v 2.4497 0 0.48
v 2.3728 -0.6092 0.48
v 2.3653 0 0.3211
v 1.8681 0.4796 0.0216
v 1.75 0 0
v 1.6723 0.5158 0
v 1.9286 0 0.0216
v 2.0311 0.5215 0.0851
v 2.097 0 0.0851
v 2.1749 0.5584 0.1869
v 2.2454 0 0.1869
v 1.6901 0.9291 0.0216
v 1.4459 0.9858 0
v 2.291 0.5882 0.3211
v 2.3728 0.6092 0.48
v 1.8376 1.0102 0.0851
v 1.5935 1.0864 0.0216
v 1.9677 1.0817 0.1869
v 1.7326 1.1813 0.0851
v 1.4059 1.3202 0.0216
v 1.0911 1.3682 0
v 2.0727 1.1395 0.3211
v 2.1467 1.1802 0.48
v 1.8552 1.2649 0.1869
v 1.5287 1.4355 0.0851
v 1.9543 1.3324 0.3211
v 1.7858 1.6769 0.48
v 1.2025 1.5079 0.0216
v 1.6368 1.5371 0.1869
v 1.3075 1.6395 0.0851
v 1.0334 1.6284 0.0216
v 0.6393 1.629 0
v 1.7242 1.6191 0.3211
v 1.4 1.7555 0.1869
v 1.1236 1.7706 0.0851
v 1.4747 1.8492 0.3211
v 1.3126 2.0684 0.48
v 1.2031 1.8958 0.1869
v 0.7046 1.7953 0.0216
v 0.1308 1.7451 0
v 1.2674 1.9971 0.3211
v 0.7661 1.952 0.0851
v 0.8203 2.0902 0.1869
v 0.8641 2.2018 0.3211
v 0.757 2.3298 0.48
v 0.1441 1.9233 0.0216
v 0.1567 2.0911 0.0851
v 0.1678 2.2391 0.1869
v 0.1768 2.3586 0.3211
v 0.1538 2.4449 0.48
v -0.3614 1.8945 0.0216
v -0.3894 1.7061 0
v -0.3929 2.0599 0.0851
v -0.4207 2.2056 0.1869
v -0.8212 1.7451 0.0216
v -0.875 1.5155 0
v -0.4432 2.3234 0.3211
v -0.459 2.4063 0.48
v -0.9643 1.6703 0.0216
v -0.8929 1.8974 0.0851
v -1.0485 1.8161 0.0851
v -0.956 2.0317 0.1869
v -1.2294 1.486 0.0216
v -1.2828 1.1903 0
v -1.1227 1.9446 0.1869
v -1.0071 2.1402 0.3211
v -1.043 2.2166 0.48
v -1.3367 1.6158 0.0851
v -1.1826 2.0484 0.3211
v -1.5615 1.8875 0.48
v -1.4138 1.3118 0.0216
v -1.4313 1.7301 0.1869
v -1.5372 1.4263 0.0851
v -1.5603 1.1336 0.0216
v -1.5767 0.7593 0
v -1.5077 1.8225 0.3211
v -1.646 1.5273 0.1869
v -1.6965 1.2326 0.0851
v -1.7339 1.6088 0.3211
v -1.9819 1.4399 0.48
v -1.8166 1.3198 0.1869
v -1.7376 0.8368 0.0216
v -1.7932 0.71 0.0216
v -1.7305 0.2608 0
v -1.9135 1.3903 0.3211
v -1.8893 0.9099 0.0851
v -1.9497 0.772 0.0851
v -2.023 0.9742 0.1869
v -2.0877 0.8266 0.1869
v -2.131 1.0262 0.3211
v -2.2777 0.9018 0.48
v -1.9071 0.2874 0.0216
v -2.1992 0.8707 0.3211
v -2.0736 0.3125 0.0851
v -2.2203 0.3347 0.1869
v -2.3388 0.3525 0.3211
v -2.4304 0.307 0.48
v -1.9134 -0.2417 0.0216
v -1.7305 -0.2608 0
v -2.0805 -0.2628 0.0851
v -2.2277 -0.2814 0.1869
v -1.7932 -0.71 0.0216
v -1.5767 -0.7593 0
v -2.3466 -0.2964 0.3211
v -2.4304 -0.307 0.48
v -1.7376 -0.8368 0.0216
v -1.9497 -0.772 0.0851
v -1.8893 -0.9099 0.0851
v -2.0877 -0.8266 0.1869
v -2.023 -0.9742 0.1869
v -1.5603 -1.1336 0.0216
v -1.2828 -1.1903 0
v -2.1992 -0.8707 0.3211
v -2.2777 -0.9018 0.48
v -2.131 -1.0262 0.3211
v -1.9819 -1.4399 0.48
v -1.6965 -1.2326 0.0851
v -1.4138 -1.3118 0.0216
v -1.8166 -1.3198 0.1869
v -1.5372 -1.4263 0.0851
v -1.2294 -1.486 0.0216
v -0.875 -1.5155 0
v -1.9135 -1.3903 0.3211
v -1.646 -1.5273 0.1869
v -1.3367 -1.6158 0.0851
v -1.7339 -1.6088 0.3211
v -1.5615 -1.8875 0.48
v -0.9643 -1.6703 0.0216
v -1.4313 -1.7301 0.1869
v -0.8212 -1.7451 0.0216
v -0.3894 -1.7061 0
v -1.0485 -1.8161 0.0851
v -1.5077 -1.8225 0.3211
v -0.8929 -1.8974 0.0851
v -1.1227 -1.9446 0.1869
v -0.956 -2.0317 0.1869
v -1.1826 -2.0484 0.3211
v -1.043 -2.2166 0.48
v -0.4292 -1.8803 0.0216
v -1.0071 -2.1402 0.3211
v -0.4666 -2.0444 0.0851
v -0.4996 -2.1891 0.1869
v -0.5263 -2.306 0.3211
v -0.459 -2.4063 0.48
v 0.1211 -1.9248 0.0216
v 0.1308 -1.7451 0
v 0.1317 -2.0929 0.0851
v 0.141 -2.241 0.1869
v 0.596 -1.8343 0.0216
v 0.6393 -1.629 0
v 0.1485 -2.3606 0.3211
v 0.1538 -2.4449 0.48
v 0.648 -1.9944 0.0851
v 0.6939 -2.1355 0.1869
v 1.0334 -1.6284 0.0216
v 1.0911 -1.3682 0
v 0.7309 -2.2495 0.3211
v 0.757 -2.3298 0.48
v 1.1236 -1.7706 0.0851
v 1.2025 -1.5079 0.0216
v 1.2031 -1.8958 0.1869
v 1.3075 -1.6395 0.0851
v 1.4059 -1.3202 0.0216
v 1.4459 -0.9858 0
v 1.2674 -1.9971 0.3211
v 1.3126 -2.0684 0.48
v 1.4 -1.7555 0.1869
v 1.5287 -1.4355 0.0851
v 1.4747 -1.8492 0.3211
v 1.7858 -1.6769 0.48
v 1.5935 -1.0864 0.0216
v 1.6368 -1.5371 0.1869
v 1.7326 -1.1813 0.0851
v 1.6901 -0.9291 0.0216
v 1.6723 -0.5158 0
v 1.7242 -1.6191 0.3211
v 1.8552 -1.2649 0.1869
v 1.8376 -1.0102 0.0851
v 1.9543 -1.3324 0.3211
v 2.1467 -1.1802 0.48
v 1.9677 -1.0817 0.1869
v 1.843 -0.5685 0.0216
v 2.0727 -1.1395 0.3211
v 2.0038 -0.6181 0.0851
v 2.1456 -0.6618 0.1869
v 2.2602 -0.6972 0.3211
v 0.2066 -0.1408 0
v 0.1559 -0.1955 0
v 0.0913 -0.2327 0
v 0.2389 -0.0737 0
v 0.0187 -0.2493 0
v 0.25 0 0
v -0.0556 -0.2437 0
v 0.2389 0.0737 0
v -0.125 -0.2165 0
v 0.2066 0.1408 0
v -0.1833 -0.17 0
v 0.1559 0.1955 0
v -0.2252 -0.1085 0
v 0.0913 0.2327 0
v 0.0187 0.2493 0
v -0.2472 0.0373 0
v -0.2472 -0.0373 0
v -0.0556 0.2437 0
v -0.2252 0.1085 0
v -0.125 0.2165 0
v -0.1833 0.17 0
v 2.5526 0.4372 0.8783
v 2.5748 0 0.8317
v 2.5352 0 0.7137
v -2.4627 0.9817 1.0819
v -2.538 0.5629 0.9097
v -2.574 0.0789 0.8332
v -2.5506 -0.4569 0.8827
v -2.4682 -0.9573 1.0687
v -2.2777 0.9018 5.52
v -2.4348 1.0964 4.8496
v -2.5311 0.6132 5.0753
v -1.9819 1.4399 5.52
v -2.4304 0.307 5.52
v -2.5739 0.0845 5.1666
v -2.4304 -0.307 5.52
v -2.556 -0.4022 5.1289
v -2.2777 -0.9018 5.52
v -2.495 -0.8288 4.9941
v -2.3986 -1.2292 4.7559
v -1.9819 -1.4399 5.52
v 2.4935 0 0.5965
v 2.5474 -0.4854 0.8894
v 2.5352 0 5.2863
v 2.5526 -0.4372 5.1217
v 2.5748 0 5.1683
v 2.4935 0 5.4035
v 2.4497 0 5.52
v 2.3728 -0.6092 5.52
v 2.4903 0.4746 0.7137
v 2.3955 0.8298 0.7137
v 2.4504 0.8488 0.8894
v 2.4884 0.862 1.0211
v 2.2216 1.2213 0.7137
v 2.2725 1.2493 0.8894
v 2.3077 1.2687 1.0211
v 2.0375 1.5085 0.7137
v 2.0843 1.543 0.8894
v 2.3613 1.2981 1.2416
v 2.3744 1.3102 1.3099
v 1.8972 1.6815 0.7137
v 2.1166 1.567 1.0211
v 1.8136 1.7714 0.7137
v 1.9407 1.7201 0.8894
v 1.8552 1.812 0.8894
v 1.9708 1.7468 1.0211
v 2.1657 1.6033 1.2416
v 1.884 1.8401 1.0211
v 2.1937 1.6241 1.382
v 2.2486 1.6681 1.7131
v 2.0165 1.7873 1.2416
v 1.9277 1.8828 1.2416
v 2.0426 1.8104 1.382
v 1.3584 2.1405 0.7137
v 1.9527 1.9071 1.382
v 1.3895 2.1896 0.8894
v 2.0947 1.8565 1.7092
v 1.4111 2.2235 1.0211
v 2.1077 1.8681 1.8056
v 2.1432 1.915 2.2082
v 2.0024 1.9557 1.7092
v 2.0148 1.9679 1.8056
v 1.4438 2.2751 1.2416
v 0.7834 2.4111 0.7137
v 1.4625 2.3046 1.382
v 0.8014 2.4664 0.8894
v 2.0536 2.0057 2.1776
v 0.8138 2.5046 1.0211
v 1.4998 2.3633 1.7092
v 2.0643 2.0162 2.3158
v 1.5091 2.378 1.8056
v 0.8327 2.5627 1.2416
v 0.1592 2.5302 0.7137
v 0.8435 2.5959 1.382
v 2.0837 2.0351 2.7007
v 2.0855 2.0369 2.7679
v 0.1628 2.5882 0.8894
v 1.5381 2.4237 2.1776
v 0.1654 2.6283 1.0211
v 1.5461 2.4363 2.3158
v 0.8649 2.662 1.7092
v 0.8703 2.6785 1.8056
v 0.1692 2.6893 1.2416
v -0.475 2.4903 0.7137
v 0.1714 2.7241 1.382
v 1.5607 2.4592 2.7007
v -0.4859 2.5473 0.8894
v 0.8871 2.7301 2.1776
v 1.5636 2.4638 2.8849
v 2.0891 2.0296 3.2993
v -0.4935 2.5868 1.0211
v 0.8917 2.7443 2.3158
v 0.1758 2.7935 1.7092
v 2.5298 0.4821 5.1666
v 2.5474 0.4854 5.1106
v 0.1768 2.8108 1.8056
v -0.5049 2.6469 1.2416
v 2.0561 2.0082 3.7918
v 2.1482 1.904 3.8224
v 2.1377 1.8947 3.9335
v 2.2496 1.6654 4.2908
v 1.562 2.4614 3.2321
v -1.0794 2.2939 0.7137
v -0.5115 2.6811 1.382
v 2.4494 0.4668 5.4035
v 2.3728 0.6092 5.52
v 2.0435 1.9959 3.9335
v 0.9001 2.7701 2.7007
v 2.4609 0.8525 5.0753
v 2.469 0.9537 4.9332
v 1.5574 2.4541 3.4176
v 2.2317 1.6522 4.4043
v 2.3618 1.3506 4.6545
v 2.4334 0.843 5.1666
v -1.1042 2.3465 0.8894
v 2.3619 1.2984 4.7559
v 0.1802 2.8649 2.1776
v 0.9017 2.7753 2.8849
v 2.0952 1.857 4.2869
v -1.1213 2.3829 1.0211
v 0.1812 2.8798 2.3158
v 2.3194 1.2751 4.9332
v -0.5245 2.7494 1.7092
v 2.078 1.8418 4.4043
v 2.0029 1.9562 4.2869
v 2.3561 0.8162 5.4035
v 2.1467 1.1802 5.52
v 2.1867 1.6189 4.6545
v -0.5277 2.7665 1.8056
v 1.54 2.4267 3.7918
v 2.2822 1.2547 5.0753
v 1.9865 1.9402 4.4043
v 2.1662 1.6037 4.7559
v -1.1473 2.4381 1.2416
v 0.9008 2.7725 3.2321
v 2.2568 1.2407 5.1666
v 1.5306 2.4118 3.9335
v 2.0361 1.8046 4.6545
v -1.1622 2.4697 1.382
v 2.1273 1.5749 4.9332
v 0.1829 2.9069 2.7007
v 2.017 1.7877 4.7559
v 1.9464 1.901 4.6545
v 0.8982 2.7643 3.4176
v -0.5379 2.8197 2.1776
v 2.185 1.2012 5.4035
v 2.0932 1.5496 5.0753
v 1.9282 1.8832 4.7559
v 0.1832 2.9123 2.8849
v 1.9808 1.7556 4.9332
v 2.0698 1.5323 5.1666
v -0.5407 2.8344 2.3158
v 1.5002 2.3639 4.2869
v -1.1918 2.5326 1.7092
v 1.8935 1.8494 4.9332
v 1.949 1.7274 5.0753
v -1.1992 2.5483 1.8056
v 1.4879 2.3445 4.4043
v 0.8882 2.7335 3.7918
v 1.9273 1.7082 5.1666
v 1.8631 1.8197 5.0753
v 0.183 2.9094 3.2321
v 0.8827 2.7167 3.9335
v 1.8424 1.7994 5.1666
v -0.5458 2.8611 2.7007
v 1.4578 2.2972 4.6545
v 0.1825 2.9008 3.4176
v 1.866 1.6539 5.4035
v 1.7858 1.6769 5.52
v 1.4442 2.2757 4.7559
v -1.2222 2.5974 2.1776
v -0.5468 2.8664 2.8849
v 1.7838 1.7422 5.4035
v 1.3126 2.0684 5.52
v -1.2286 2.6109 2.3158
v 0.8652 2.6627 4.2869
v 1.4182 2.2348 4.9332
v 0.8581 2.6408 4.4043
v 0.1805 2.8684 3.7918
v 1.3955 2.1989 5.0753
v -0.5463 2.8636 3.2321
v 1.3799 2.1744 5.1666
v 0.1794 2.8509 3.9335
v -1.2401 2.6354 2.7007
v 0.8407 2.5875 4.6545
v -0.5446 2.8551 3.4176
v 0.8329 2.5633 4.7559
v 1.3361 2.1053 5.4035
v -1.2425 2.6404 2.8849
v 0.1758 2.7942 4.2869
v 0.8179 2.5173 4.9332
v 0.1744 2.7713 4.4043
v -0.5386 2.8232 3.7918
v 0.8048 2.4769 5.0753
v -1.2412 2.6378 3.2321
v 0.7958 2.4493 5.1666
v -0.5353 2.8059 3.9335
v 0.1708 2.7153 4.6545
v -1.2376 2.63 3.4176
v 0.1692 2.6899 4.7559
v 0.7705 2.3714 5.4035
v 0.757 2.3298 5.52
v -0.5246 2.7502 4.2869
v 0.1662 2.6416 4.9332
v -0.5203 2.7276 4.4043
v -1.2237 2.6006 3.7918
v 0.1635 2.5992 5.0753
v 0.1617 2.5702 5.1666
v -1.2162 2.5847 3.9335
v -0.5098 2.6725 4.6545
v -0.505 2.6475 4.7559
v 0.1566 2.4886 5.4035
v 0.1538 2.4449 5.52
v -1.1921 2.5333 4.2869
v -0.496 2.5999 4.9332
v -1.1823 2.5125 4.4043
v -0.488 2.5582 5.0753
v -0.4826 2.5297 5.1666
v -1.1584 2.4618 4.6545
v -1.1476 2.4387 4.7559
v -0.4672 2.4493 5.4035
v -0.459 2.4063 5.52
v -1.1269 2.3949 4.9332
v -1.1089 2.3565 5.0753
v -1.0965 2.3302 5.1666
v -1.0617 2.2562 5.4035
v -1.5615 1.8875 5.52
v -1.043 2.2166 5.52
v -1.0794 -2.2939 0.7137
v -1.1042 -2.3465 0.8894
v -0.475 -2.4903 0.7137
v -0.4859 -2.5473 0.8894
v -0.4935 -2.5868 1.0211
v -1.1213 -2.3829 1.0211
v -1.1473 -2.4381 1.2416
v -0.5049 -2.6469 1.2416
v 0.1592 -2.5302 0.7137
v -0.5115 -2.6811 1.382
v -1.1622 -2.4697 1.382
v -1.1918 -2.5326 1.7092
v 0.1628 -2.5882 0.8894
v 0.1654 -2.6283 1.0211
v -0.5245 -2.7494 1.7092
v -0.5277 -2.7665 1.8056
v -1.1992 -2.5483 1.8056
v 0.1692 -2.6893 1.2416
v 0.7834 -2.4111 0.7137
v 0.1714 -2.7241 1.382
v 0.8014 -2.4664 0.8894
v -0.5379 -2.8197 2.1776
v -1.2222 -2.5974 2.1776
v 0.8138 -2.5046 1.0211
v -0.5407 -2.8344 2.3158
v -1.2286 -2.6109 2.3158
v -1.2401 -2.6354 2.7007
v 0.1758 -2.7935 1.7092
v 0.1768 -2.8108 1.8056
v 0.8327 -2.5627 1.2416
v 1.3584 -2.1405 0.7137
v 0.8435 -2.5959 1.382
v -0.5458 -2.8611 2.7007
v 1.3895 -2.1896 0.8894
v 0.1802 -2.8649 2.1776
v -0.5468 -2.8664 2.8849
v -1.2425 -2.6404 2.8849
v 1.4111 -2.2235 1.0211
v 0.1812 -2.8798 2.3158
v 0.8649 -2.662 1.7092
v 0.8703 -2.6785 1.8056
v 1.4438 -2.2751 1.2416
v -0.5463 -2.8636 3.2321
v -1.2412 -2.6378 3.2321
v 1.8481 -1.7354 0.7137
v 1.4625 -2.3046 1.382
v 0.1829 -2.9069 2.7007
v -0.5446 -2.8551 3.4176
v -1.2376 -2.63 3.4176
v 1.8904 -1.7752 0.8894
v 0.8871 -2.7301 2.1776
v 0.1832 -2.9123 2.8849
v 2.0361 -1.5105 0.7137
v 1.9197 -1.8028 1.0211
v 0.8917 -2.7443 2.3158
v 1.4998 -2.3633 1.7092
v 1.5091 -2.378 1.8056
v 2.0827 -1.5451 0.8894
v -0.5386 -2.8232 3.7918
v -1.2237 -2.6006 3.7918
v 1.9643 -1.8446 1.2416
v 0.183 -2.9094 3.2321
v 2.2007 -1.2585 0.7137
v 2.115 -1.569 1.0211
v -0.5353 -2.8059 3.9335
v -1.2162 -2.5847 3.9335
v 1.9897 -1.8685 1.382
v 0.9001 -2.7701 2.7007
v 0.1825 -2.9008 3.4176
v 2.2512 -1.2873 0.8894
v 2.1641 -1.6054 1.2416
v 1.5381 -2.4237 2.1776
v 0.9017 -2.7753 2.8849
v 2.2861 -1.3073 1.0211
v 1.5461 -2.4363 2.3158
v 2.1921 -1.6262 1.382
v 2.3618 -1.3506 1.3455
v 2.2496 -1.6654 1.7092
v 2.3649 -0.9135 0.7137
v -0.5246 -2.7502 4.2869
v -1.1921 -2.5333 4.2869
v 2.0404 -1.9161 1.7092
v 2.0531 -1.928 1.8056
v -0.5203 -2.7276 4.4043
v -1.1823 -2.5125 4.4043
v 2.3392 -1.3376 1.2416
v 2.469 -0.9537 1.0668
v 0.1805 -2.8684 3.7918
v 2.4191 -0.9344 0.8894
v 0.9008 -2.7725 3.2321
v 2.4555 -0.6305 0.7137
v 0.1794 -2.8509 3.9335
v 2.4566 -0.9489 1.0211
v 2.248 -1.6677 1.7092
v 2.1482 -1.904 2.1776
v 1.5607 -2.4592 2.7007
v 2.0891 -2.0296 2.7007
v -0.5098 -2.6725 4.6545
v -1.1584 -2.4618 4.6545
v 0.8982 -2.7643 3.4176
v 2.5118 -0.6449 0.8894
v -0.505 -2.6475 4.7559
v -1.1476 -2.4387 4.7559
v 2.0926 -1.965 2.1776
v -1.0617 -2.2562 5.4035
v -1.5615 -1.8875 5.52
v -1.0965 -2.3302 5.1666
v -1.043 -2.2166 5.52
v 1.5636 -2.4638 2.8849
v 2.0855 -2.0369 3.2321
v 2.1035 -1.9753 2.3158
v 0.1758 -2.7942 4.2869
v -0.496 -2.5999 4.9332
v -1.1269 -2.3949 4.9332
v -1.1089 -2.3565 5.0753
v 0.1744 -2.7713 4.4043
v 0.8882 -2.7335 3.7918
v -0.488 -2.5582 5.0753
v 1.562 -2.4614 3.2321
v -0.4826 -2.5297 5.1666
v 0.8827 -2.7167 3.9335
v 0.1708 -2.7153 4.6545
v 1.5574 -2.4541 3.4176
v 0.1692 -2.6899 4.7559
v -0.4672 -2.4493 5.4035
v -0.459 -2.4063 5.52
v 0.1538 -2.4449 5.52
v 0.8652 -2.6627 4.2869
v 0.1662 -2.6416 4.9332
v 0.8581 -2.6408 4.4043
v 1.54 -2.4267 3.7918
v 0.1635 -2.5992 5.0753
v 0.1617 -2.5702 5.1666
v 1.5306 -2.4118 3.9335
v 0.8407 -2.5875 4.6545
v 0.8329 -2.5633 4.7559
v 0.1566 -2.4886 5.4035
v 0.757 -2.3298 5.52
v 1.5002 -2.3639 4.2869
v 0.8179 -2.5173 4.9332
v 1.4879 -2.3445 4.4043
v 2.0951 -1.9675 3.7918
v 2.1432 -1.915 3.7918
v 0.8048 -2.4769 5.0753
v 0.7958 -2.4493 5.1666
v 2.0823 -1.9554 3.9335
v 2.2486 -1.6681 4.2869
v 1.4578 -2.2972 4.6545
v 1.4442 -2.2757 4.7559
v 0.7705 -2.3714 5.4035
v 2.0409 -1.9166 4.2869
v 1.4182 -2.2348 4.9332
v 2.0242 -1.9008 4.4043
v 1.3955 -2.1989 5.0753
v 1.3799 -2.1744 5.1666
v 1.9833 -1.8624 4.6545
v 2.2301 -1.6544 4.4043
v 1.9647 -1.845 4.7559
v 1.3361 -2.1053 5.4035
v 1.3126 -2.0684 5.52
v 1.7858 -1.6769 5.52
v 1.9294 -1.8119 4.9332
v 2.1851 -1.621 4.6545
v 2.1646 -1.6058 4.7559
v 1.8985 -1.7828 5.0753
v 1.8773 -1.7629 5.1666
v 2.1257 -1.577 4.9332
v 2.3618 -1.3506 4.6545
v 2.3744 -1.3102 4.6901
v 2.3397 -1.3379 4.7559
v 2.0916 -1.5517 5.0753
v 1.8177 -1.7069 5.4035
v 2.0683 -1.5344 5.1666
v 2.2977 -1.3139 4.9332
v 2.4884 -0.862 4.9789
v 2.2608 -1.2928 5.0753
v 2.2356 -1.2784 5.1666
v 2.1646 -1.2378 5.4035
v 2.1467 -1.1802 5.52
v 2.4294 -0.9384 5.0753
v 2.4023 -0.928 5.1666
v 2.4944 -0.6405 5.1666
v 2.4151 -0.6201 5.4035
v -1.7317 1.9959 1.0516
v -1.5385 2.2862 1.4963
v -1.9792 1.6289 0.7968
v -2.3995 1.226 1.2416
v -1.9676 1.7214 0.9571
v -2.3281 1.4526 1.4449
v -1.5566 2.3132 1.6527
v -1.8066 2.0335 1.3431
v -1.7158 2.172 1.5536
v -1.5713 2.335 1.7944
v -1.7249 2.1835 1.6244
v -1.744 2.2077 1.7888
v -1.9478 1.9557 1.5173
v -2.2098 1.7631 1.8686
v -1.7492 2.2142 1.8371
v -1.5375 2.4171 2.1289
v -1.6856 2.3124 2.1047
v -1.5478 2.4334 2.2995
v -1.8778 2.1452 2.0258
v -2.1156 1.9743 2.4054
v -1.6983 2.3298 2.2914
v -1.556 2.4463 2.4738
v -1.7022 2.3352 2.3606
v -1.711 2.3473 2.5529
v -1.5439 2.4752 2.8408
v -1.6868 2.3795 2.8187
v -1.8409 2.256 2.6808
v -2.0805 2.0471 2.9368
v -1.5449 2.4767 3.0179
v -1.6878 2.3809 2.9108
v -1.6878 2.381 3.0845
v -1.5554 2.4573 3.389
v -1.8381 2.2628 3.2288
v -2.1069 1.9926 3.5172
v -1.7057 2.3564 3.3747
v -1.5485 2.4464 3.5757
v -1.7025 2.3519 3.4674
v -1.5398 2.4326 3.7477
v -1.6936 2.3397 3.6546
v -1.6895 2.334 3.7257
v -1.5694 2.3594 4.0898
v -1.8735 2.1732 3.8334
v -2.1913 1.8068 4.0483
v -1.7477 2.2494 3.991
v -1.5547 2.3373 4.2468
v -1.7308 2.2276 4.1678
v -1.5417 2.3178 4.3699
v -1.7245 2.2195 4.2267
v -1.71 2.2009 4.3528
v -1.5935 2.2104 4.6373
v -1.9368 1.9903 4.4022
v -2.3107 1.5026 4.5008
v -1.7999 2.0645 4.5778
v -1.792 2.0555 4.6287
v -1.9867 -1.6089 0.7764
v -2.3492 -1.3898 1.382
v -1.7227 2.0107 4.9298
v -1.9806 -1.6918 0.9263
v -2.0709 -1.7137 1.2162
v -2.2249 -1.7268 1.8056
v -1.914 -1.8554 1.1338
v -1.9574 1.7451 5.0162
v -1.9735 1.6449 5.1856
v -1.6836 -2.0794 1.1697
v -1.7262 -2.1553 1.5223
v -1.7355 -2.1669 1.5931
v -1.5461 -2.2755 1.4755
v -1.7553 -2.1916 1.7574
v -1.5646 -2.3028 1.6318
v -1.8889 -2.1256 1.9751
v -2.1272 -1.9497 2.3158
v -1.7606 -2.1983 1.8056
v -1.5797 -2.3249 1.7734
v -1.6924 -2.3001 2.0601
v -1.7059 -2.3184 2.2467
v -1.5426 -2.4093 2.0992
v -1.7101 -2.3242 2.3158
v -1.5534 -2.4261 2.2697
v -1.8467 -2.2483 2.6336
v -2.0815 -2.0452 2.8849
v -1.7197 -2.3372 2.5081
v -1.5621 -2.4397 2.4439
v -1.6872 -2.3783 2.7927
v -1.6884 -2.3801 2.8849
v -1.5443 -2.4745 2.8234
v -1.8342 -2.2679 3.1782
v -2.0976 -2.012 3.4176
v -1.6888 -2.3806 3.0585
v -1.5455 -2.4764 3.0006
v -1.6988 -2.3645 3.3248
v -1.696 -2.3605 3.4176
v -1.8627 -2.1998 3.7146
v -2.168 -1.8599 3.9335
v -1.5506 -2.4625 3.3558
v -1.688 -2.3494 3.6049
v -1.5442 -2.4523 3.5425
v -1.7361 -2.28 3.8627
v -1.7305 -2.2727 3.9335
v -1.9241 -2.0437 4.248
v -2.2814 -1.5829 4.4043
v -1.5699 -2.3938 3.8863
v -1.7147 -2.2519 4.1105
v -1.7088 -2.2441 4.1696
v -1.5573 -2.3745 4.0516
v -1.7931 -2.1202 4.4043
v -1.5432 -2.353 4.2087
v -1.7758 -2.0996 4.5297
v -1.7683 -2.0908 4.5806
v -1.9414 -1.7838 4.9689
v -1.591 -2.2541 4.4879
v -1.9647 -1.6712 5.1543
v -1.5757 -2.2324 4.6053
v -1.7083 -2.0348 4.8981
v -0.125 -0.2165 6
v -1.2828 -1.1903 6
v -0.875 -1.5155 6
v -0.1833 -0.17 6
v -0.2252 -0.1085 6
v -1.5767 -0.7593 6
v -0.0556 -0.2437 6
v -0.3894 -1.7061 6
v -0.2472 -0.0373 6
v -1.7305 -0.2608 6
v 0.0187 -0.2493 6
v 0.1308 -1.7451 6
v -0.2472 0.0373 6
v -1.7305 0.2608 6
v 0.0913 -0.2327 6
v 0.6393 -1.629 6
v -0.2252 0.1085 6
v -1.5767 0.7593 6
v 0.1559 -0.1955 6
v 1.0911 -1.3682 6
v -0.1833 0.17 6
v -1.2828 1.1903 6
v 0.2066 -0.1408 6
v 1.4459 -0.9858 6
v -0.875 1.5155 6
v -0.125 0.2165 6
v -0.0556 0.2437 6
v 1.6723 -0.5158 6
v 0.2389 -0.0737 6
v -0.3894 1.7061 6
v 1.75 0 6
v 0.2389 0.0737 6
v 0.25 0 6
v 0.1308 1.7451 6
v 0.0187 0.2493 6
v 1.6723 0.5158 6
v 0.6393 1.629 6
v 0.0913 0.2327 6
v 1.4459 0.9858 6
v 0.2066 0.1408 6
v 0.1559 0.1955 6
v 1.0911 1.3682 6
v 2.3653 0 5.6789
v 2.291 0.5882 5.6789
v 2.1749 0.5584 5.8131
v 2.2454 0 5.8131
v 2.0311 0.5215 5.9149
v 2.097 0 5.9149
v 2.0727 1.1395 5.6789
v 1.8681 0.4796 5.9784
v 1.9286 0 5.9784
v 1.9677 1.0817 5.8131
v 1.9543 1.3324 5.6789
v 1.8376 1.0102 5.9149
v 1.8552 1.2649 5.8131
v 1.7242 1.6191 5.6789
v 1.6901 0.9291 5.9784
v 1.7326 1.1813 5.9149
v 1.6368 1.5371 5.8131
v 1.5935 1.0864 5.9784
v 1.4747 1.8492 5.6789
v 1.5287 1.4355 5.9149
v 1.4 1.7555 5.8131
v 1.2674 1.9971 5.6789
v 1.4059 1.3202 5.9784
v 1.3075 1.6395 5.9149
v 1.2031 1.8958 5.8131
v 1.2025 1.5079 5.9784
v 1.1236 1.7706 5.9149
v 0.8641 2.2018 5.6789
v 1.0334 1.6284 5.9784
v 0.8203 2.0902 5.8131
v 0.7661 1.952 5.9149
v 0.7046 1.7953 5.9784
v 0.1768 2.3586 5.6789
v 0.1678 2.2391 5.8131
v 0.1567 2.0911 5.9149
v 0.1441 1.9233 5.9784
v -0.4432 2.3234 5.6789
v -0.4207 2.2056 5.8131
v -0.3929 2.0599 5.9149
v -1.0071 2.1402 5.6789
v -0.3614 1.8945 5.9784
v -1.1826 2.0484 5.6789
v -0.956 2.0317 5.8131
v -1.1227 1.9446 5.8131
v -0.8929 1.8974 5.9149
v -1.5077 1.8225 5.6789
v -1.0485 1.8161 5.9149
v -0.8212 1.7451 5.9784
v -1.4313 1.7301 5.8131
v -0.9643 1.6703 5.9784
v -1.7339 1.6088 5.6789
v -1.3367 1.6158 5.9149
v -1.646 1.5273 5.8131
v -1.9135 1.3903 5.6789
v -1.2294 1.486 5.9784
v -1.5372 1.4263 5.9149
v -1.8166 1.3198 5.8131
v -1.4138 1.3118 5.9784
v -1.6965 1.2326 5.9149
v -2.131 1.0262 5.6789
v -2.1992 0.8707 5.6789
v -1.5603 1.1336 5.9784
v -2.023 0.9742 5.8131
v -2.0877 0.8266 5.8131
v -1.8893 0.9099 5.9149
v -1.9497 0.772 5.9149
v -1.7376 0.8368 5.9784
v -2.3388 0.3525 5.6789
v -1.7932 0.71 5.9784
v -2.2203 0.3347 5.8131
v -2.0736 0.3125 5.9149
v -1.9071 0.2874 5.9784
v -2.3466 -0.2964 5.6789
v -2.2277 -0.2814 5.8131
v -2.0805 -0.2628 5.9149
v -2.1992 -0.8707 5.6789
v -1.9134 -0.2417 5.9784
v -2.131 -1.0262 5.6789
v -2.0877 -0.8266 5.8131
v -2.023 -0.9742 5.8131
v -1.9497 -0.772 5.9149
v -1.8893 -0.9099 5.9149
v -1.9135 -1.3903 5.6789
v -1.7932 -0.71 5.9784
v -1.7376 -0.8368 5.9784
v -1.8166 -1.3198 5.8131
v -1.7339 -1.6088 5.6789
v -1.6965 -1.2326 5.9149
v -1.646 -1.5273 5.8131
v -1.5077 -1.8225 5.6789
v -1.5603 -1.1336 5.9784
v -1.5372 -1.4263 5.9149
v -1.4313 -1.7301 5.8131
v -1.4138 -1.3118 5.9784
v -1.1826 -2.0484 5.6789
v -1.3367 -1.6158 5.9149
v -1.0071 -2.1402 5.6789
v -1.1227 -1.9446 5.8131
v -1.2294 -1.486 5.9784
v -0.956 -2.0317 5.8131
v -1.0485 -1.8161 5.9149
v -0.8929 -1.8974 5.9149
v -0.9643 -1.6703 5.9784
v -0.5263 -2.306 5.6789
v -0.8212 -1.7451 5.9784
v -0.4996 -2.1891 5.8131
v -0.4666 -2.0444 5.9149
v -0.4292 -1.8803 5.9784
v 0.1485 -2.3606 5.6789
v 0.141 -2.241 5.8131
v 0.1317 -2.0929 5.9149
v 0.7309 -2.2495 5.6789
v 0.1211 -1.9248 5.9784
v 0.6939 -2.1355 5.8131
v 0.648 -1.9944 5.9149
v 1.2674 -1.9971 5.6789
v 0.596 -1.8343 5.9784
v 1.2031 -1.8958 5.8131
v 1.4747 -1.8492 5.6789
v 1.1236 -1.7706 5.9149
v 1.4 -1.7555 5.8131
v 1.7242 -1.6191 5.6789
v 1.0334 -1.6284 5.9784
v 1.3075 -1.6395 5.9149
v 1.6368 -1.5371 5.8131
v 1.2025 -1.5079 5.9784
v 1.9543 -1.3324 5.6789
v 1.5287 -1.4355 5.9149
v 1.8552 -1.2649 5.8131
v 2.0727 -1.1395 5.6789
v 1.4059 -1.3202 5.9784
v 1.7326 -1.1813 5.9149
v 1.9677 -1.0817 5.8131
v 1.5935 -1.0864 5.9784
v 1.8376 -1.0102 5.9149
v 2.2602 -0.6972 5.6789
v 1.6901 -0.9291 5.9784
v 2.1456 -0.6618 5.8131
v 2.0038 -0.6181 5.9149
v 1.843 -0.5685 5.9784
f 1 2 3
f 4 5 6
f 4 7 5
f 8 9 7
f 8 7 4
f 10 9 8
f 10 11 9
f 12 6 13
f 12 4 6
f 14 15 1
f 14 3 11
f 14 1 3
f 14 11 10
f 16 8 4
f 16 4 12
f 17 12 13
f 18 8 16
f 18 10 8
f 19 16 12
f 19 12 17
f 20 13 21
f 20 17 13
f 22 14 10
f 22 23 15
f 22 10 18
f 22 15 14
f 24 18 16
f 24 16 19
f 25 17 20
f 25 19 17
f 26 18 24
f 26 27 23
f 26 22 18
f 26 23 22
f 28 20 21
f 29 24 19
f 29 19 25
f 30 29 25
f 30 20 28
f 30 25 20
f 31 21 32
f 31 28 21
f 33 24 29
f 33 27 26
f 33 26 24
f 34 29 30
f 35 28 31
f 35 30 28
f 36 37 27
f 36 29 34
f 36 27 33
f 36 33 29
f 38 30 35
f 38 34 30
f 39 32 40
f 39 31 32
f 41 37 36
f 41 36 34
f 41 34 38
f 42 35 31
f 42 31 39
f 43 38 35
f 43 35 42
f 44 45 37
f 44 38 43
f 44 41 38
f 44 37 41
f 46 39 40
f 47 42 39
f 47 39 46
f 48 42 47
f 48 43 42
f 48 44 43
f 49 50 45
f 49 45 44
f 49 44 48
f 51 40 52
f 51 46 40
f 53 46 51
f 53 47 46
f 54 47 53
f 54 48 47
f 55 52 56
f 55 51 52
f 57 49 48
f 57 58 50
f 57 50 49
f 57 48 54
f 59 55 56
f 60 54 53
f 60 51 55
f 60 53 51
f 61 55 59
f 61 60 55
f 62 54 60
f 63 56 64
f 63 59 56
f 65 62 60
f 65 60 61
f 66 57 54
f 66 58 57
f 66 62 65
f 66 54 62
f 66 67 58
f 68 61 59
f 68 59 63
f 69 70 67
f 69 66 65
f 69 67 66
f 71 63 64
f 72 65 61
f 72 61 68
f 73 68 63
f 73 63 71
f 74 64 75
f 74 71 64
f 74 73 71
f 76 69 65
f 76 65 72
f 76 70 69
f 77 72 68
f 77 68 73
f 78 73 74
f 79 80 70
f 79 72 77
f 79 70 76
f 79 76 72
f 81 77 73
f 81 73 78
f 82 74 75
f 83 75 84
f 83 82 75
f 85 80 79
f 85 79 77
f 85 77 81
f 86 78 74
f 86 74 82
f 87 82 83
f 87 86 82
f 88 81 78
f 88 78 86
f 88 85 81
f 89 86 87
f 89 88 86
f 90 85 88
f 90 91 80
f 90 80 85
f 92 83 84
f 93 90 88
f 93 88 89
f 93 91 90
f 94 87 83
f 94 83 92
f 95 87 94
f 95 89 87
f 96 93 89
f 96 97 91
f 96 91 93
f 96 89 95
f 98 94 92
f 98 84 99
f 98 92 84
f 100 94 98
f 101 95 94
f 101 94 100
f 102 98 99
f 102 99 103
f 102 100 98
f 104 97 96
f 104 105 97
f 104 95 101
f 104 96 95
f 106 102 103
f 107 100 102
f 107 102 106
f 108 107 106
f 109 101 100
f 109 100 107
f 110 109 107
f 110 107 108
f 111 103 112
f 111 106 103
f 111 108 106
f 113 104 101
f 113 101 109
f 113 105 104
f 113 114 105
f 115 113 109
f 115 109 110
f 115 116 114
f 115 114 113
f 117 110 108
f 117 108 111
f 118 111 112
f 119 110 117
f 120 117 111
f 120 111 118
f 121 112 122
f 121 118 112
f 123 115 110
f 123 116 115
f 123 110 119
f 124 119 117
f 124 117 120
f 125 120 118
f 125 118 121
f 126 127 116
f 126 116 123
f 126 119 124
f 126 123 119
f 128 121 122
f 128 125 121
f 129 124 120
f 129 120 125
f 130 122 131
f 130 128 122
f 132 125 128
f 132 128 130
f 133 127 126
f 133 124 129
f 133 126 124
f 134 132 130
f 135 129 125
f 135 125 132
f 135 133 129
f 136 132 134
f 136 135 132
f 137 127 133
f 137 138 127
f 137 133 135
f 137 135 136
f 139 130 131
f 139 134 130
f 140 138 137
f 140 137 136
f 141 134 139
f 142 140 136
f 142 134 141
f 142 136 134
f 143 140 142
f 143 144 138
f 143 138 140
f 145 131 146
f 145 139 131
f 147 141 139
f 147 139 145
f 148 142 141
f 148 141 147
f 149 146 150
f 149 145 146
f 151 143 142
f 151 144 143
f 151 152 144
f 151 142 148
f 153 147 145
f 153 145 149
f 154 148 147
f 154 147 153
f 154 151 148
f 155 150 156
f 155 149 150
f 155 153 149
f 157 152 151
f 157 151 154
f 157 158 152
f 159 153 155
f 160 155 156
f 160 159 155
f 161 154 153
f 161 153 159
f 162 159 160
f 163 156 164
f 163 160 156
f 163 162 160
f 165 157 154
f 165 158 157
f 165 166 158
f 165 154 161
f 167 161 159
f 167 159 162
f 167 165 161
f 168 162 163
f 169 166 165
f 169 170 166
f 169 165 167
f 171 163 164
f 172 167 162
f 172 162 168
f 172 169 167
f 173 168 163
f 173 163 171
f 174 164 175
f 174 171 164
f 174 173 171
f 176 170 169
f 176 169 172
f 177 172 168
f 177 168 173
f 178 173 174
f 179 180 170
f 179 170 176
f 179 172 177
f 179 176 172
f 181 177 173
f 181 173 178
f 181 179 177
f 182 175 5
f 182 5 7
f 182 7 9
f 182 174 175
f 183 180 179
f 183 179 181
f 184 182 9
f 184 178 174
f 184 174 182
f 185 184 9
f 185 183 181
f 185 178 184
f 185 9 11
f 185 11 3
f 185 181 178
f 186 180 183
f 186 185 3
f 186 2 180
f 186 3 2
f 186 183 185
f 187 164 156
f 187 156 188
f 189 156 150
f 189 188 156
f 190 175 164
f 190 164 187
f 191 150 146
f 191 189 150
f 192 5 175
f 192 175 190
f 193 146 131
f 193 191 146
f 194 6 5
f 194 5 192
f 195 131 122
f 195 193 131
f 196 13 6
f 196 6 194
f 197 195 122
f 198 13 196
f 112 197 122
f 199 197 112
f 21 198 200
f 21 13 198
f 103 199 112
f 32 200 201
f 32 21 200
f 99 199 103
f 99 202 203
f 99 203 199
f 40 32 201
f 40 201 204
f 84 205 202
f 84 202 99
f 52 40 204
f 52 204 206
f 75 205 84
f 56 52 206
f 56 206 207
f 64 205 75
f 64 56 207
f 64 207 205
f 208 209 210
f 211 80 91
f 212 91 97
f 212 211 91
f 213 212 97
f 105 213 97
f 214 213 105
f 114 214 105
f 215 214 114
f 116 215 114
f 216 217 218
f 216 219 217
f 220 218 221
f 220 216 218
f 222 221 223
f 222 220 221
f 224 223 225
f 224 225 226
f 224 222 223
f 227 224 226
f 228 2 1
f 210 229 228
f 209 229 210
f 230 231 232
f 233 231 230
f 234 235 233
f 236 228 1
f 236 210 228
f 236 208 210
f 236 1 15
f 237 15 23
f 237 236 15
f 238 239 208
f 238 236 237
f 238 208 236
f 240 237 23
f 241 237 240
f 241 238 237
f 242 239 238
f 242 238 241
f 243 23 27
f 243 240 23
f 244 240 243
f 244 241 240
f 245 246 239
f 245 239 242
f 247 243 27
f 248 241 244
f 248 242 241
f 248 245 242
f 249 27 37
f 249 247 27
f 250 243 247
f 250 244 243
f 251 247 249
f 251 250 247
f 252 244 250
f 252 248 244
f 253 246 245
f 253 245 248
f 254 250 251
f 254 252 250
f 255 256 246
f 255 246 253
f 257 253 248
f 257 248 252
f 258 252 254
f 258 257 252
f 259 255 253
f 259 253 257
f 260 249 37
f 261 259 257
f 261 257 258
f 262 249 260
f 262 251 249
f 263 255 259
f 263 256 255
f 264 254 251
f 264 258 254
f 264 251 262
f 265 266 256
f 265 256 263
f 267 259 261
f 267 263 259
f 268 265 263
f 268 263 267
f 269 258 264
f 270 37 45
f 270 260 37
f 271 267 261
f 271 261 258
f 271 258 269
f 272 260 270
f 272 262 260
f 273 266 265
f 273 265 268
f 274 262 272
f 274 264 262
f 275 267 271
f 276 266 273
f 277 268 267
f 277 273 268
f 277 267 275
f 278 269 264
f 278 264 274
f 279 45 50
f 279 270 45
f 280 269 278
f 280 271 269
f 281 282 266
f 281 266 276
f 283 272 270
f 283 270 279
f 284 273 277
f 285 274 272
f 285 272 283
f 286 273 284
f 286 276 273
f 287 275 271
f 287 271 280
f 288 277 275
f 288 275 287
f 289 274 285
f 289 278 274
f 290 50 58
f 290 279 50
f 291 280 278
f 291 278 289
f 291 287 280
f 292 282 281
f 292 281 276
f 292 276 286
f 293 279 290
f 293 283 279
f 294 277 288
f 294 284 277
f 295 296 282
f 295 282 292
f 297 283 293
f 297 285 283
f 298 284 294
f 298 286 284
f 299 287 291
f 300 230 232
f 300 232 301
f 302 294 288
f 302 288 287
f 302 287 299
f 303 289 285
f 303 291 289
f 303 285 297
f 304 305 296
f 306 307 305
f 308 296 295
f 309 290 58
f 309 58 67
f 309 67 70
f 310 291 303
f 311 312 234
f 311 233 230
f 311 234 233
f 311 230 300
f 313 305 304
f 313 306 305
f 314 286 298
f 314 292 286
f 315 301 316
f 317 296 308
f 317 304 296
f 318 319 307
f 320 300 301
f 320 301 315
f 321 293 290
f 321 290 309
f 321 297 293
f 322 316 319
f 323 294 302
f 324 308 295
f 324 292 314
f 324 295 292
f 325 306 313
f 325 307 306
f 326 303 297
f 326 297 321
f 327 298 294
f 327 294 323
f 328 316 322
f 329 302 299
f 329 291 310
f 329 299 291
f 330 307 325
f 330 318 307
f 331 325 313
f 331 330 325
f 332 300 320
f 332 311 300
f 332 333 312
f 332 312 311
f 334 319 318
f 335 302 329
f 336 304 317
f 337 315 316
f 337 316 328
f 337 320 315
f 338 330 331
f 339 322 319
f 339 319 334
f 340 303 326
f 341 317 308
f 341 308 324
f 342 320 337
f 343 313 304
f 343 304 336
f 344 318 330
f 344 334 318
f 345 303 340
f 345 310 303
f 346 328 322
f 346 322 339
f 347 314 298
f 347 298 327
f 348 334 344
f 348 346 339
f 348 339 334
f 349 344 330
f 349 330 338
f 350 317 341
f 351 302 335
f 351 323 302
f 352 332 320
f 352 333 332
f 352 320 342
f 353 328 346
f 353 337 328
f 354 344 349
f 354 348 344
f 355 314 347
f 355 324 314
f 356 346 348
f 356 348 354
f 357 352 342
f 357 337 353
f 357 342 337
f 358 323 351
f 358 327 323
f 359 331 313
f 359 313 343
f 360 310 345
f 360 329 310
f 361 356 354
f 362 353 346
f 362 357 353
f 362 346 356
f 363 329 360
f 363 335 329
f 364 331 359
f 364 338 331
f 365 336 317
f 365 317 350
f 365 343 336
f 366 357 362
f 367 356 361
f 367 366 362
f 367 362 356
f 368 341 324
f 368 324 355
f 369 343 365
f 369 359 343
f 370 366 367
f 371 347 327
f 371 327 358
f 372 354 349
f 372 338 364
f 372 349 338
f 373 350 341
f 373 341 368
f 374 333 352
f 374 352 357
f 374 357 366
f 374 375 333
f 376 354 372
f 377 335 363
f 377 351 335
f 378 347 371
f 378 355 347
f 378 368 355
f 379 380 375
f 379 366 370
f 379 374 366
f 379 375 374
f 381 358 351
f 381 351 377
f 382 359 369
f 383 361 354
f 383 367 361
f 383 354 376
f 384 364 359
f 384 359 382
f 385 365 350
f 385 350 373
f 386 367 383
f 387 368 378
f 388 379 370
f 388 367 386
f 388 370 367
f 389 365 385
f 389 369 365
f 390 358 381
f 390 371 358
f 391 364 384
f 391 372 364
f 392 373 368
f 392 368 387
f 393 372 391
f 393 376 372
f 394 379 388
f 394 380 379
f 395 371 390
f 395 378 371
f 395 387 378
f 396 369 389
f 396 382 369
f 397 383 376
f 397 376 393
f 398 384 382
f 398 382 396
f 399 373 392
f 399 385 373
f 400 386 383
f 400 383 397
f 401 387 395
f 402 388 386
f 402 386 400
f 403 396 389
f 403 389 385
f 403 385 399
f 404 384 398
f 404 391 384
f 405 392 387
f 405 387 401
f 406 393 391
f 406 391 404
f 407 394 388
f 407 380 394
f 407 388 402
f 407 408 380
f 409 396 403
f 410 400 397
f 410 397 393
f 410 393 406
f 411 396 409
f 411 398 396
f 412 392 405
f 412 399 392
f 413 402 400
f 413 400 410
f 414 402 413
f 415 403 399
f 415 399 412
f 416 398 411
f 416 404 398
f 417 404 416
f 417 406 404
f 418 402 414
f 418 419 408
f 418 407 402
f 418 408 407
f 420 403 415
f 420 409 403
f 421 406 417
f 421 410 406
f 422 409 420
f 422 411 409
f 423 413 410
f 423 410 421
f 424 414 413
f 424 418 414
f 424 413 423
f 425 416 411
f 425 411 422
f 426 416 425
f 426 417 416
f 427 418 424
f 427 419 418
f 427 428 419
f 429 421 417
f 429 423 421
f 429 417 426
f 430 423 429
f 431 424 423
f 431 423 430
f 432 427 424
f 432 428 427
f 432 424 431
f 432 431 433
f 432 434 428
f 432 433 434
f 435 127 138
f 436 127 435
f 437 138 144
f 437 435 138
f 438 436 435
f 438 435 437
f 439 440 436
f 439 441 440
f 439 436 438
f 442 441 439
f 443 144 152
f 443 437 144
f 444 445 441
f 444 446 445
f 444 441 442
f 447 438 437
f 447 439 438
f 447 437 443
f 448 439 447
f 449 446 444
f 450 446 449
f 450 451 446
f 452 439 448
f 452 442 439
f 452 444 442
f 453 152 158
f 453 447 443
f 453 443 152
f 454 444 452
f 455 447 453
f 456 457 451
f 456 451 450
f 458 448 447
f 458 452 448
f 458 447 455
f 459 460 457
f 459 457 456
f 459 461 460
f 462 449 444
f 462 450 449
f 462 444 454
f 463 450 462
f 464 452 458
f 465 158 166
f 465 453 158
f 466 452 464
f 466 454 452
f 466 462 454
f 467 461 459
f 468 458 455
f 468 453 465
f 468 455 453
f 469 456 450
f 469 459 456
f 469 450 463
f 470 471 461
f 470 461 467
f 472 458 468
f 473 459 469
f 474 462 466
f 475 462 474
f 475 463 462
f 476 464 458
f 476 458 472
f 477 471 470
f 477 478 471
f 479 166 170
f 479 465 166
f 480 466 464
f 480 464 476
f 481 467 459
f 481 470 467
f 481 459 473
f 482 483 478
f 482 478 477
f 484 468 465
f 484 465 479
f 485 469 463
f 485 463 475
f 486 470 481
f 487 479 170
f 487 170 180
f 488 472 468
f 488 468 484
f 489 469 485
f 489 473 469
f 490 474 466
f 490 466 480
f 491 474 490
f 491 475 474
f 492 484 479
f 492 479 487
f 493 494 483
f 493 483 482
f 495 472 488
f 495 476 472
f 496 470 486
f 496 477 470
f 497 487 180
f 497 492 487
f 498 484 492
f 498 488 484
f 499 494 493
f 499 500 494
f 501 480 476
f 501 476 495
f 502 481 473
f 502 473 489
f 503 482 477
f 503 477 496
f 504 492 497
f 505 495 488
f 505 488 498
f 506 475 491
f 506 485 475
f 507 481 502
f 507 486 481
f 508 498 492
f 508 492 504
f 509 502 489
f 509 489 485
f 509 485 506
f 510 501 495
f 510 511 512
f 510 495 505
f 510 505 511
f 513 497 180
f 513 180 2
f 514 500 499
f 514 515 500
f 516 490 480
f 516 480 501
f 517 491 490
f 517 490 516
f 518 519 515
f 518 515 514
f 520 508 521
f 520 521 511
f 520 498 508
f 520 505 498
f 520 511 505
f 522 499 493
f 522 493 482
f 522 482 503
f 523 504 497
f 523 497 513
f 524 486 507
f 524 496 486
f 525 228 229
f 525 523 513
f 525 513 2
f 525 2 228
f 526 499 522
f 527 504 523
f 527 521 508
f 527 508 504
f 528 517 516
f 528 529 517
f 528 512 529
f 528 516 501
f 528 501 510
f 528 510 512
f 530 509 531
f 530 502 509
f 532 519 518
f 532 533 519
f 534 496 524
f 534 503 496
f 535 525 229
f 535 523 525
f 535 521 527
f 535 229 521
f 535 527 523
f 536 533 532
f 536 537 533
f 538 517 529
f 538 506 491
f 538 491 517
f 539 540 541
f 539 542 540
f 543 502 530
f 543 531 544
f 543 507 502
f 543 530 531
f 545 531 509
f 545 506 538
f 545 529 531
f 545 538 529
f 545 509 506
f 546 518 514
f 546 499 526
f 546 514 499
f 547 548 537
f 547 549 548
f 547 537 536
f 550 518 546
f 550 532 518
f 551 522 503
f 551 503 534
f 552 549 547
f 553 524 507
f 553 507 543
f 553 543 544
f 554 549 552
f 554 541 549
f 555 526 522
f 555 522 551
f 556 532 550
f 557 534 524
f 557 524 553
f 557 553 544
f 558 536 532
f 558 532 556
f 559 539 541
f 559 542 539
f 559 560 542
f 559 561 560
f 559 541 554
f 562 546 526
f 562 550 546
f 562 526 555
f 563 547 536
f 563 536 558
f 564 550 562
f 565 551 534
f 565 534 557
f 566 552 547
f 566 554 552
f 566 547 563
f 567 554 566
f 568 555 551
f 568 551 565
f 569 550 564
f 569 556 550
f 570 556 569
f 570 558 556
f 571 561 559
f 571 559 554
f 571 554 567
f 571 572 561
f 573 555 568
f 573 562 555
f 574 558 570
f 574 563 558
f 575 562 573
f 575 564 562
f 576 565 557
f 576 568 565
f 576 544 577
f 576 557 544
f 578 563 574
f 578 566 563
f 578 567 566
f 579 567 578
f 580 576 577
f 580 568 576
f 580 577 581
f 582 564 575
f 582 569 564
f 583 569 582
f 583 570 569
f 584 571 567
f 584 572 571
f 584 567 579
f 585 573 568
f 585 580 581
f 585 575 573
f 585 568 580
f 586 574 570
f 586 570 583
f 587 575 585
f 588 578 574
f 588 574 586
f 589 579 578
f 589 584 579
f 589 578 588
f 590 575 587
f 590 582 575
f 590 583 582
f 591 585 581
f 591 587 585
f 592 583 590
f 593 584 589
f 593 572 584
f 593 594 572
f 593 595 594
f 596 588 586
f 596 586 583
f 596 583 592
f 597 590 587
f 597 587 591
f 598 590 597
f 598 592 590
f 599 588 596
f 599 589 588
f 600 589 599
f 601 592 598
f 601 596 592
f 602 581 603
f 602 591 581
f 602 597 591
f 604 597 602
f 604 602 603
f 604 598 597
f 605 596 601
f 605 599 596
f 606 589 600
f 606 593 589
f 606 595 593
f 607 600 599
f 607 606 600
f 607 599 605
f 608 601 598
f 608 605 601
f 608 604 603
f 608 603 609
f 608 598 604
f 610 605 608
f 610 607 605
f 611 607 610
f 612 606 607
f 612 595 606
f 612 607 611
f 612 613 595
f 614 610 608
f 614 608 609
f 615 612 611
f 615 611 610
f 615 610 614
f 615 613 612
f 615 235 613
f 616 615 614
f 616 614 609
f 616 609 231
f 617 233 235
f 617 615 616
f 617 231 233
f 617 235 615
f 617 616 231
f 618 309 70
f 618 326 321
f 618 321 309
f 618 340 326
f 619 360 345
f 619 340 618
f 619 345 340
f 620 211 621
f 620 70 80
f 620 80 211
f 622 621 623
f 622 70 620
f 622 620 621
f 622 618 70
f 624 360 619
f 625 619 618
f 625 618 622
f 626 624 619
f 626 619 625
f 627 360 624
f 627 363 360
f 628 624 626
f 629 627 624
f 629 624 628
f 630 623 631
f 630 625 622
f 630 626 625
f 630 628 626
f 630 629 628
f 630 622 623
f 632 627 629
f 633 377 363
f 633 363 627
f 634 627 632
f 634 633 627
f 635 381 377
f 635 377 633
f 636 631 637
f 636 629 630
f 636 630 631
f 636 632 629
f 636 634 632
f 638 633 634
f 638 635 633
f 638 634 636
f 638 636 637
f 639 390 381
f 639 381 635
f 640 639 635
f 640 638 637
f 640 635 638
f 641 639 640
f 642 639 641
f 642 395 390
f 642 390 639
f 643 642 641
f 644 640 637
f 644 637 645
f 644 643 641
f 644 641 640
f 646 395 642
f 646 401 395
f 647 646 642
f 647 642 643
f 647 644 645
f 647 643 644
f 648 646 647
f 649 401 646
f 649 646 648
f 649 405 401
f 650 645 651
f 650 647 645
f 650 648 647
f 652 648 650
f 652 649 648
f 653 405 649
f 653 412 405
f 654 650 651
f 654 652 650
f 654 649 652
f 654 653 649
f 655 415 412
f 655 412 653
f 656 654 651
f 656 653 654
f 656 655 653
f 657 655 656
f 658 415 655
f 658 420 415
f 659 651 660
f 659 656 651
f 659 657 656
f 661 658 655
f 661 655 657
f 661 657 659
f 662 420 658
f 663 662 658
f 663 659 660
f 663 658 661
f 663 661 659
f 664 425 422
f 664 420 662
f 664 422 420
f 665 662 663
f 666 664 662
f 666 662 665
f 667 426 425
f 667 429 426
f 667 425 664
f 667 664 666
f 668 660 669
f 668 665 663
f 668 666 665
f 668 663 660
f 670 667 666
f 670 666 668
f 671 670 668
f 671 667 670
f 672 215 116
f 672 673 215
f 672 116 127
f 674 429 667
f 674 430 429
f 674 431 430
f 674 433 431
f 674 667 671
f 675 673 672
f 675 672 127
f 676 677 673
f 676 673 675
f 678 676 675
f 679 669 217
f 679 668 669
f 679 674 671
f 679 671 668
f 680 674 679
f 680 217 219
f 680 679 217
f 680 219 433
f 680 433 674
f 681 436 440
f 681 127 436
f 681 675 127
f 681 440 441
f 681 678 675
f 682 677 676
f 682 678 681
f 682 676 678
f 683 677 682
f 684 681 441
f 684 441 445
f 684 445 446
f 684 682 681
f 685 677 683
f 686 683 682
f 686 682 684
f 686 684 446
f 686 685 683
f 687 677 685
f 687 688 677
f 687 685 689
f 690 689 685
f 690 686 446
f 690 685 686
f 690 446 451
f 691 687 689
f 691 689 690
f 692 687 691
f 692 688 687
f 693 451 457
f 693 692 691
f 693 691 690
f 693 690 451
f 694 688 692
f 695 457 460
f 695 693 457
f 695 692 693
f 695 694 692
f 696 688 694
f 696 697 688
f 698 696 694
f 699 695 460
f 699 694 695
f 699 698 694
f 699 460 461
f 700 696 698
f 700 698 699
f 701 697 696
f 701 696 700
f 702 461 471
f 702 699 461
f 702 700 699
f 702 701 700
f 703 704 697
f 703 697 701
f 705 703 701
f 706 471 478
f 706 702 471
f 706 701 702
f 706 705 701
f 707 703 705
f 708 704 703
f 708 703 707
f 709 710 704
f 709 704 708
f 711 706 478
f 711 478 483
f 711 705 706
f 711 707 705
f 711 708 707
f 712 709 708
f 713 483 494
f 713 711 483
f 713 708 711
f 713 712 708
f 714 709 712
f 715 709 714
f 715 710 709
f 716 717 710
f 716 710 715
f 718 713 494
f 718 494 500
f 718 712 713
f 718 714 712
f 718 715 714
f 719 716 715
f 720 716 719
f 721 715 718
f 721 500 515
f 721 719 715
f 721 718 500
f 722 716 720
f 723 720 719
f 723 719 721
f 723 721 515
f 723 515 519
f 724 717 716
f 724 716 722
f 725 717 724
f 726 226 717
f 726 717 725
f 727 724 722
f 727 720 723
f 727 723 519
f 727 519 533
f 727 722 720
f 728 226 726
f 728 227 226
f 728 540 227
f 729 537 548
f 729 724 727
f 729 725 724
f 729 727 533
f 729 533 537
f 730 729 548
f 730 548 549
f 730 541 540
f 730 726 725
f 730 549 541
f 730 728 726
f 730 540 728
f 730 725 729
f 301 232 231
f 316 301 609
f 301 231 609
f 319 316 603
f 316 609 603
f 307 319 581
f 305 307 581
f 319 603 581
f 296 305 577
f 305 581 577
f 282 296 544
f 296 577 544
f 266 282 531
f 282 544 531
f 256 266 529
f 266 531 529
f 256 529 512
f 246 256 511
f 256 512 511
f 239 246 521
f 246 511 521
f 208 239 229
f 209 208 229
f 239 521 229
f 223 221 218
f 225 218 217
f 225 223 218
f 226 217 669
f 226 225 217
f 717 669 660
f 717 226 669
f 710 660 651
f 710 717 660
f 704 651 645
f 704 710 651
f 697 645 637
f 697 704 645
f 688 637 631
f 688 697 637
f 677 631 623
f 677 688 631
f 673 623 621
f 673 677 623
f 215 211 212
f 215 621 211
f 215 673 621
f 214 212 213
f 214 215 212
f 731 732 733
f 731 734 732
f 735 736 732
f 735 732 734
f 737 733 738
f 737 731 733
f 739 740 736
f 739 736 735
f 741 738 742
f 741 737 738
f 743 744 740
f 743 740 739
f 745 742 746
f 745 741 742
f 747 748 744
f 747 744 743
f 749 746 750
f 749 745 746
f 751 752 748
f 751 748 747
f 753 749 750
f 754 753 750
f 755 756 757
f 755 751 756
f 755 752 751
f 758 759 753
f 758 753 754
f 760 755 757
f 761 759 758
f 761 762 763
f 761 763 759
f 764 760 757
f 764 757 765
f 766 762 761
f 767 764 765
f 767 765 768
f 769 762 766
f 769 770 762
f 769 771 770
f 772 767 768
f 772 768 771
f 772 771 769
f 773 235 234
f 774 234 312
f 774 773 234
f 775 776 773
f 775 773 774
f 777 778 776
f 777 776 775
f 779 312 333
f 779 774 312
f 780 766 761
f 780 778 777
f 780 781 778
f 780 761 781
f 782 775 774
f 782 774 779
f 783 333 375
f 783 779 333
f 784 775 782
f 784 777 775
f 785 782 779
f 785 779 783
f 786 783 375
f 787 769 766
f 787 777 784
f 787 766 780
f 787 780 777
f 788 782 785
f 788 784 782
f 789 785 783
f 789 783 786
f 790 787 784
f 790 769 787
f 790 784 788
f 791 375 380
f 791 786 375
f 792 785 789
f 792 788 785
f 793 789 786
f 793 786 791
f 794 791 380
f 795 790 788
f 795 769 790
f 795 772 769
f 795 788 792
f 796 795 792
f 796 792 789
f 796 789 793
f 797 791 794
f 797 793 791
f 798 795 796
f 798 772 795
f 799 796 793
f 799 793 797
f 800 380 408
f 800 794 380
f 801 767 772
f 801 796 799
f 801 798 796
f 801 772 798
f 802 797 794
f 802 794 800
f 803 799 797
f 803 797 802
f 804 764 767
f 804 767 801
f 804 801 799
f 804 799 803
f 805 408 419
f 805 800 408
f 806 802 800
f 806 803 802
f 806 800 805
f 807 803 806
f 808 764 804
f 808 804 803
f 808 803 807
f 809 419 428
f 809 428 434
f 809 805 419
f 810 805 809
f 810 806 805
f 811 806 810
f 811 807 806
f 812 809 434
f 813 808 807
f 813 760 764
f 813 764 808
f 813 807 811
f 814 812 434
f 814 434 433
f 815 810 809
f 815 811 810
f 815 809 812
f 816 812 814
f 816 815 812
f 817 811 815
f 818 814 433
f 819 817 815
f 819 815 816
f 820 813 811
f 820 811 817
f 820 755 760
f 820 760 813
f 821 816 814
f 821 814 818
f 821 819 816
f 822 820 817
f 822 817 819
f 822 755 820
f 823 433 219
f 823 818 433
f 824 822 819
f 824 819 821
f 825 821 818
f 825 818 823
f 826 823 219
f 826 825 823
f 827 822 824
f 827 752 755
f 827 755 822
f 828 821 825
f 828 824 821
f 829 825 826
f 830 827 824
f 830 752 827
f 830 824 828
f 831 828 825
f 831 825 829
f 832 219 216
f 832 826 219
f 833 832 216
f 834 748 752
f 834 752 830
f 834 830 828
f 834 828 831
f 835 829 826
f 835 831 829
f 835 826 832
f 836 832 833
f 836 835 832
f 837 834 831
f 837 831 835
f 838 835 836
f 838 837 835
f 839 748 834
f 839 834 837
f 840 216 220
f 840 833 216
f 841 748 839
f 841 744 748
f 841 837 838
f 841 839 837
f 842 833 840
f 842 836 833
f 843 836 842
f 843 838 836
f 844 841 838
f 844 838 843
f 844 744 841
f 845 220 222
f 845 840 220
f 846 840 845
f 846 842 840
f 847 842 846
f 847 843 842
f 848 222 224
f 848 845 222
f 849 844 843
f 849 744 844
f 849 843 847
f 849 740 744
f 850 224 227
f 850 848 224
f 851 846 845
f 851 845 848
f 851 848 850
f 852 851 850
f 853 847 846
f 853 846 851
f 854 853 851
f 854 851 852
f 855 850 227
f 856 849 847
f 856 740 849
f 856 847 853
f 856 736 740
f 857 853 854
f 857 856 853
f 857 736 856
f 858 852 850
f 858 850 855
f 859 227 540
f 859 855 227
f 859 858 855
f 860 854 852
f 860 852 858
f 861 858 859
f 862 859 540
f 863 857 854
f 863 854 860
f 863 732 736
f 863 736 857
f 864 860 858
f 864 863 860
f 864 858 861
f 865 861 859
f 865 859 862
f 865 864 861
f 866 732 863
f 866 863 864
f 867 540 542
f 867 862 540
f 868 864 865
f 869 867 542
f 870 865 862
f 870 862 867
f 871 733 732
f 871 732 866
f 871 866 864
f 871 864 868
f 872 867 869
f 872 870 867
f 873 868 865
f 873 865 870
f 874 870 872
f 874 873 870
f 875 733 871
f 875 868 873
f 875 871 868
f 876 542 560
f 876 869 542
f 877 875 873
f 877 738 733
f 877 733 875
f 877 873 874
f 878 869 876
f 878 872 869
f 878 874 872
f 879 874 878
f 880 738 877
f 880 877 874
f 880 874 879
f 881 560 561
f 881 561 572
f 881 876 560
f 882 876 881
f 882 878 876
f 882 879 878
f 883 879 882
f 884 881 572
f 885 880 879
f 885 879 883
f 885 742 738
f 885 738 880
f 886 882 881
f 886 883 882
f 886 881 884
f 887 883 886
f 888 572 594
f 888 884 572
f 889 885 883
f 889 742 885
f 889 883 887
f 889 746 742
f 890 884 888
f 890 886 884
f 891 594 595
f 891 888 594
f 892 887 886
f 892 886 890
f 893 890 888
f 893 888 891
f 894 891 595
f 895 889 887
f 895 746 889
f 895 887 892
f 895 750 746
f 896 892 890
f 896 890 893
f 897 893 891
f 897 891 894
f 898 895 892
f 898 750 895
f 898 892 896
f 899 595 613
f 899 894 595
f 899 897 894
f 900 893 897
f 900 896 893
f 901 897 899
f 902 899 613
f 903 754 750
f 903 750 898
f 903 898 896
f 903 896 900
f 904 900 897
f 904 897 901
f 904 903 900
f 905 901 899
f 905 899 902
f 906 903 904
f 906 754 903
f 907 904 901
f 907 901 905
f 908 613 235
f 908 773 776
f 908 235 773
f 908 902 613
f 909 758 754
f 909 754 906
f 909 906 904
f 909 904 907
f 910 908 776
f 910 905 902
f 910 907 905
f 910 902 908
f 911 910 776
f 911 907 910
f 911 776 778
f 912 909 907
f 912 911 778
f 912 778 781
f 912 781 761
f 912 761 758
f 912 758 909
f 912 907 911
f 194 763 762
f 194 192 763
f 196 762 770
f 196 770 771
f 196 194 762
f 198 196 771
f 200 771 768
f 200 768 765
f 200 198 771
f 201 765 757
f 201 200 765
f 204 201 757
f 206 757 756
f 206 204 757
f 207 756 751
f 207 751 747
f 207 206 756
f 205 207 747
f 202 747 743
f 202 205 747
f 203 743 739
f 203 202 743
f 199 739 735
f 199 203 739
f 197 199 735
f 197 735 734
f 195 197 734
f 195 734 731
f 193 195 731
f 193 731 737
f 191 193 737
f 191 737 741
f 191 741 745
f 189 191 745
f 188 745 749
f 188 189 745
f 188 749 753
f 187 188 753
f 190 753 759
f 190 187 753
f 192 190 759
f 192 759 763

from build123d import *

# Parameters (mm, degrees)
F3_DEPTH      = 3
F3_DEPTH_BACK = 3


with BuildPart() as f1:
    # F0 (on Front) → F1 (revolve)
    with BuildSketch(Plane.XZ):
        with BuildLine():
            Line((0.25, 6), (0.25, 0))
            Line((0.25, 0), (1.75, 0))
            ThreePointArc((1.75, 0), (2.174264, 0.131534), (2.449714, 0.48))
            ThreePointArc((2.449714, 0.48), (2.919048, 3), (2.449714, 5.52))
            ThreePointArc((2.449714, 5.52), (2.174264, 5.868466), (1.75, 6))
            Line((1.75, 6), (0.25, 6))
        make_face()
    revolve(axis=Axis((0, 0, 4.403635), (0, 0, 1)))


with BuildPart() as f3:
    # F2 (on Front) → F3 (new body, two sides)
    with BuildSketch(Plane.XZ) as f3_sk:
        with BuildLine():
            Line((3.75, 5.5), (2.75, 5.5))
            ThreePointArc((2.75, 5.5), (2.080127, 3), (2.75, 0.5))
            Line((2.75, 0.5), (3.75, 0.5))
            Line((3.75, 0.5), (3.75, 5.5))
        make_face()
    extrude(amount=F3_DEPTH)
    extrude(f3_sk.sketch, amount=-F3_DEPTH_BACK)


with BuildPart() as f4_1:
    # F4: instance of F3
    add(f3.part.mirror(Plane.YZ))


with BuildPart() as f1_1:
    add(f1.part)

    # F5: cut F3, F4_1
    add(f3.part, mode=Mode.SUBTRACT)
    add(f4_1.part, mode=Mode.SUBTRACT)


solid = f1_1.part
